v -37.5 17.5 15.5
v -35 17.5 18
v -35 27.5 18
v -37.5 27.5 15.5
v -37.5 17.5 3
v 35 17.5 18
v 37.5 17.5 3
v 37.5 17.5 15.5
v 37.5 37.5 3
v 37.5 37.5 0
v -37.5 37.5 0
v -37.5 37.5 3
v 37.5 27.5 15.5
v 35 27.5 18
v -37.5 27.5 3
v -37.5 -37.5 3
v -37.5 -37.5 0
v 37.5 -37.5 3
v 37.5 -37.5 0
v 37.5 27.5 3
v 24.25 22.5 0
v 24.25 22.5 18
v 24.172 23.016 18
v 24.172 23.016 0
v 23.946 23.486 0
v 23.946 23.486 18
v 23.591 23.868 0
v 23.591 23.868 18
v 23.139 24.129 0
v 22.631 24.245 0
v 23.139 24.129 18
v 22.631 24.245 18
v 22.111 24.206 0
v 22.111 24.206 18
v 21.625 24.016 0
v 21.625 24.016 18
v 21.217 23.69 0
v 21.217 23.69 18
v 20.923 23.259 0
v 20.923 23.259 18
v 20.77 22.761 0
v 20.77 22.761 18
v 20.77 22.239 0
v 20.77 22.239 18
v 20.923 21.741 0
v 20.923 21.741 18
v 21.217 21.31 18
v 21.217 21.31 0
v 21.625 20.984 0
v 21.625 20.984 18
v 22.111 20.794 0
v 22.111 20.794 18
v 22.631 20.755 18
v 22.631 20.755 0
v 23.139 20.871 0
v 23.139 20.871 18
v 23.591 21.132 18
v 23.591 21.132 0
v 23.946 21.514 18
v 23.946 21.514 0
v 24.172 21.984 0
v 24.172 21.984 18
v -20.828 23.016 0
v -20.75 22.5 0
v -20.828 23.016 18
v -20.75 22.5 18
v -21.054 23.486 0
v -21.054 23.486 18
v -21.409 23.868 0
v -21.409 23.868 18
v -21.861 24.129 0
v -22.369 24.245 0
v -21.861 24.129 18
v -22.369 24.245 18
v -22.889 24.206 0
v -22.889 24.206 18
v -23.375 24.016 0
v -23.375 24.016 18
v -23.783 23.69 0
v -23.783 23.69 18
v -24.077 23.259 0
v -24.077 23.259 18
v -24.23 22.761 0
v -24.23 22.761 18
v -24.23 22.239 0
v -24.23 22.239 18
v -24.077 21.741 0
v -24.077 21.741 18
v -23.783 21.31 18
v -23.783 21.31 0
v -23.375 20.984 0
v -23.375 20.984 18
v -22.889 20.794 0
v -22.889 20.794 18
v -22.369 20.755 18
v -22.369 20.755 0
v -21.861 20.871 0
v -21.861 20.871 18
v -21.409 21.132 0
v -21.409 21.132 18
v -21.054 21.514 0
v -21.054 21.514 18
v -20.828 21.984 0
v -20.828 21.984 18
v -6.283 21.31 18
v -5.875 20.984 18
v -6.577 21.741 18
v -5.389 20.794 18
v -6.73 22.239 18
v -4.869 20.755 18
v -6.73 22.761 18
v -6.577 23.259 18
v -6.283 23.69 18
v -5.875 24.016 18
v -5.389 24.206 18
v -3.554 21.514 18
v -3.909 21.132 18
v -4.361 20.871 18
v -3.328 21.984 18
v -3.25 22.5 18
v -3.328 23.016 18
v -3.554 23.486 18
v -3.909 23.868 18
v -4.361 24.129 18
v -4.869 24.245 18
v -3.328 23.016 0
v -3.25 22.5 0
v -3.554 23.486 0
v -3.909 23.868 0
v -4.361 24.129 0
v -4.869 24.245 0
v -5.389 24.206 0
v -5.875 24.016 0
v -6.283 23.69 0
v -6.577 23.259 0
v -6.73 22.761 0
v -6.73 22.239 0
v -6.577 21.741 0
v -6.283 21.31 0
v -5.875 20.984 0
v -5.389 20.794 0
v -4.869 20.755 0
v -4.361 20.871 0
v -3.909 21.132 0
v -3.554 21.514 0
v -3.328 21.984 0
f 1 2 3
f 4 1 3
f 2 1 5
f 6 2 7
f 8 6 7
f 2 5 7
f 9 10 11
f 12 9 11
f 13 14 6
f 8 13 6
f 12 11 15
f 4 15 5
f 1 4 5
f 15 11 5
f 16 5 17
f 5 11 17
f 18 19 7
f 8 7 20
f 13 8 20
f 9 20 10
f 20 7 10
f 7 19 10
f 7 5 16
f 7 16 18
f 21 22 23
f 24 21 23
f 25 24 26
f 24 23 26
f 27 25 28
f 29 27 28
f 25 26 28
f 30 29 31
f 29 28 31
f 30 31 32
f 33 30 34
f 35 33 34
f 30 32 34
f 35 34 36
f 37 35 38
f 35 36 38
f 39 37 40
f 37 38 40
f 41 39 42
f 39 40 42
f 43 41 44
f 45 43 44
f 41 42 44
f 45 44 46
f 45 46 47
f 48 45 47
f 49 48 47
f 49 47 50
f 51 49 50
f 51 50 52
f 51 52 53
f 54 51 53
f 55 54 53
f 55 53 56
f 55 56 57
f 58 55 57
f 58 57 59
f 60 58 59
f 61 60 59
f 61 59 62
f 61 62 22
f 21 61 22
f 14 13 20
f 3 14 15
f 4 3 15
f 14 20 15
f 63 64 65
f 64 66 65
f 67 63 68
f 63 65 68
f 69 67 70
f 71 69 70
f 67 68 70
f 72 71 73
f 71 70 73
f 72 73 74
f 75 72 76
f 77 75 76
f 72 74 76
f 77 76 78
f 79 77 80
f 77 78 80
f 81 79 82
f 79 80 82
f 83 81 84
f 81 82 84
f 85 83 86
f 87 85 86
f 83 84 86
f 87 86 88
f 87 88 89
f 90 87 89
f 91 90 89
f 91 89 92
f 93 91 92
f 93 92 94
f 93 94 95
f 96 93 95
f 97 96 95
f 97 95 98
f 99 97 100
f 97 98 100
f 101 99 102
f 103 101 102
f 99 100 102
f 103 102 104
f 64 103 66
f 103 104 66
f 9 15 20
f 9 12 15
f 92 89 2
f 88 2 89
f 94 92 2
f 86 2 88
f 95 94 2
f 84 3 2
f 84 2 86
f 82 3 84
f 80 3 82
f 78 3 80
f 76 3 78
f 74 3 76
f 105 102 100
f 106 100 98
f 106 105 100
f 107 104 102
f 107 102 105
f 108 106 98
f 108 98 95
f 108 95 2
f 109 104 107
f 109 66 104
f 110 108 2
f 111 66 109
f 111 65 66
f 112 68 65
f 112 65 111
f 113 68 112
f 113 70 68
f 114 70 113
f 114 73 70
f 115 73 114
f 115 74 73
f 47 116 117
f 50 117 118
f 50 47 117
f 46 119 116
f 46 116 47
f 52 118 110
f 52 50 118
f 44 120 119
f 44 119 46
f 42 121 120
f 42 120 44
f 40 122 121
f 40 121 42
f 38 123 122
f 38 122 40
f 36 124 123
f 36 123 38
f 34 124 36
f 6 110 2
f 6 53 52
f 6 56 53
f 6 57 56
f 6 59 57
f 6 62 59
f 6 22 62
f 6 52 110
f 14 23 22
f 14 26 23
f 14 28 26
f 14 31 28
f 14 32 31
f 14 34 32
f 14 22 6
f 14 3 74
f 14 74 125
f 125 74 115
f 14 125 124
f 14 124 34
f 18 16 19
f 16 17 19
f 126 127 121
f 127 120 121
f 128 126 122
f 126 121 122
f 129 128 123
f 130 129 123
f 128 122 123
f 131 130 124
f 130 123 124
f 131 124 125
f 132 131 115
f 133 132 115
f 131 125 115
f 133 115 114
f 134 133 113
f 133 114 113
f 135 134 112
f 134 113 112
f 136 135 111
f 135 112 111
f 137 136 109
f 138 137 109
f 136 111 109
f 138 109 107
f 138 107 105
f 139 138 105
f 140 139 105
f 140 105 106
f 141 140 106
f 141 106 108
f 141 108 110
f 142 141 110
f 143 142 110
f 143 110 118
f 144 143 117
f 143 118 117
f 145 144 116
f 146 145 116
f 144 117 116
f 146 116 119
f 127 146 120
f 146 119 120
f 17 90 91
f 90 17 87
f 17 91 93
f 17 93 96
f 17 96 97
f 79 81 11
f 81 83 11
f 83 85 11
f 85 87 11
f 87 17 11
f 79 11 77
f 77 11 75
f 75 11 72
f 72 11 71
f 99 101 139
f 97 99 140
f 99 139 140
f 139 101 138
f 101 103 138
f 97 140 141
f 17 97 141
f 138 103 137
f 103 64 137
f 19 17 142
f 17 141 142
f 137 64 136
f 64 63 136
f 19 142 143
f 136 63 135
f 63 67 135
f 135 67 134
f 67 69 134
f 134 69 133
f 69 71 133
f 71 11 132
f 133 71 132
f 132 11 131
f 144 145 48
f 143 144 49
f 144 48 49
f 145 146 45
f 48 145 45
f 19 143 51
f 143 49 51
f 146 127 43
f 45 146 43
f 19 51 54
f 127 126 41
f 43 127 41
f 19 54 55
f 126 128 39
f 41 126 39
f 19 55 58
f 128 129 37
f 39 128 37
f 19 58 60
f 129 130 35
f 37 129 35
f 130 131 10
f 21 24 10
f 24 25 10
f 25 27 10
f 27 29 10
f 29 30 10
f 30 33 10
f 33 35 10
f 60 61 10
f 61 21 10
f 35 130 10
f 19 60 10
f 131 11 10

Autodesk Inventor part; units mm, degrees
ref_plane "YZ Plane" through (0, 0, 0) normal (1, 0, 0) x (0, 1, 0)
ref_plane "XZ Plane" through (0, 0, 0) normal (0, 1, 0) x (-1, 0, 0)
ref_plane "XY Plane" through (0, 0, 0) normal (0, 0, 1) x (1, 0, 0)
sketch "Sketch1" plane through (0, 0, 0) normal (0, 0, 1) x (1, 0, 0)
  line L0 (-52.5, 0) -> (52.5, 0) projected
  line L1 (0, -52.5) -> (0, 52.5) projected
  line L2 (-37.5, -37.5) -> (37.5, -37.5)
  line L3 (37.5, -37.5) -> (37.5, 37.5)
  line L4 (37.5, 37.5) -> (-37.5, 37.5)
  line L5 (-37.5, 37.5) -> (-37.5, -37.5)
  line L6 (-37.5, -37.5) -> (37.5, 37.5) construction
  line L7 (37.5, -37.5) -> (-37.5, 37.5) construction
  point P0 (0, 0)
  dimension "d0" = 75
  dimension "d1" = 75
extrude "Extrusion1" add sketch "Sketch1" along normal blind 3
sketch "Sketch2" plane through (0, 0, 3) normal (0, 0, 1) x (1, 0, 0)
  line L0 (37.5, -37.5) -> (37.5, 37.5) projected
  line L1 (37.5, 37.5) -> (-37.5, 37.5) projected
  line L2 (37.5, 17.5) -> (37.5, 27.5)
  line L3 (37.5, 27.5) -> (-37.5, 27.5)
  line L4 (-37.5, 27.5) -> (-37.5, 17.5)
  line L5 (-37.5, 17.5) -> (37.5, 17.5)
  point P0 (0, 0)
  dimension "d4" = 10
  dimension "d5" = 10
extrude "Extrusion2" add sketch "Sketch2" along normal blind 15
chamfer "Chamfer1" distance 2.5 angle 45 2 edges at (37.5, 22.5, 18) (-37.5, 22.5, 18)
sketch "Sketch3" plane through (0, 0, 18) normal (0, 0, 1) x (1, 0, 0)
  line L0 (-35, 17.5) -> (-35, 27.5) projected
  line L1 (35, 27.5) -> (35, 17.5) projected
  line L2 (-35, 22.5) -> (35, 22.5) construction
  circle A0 centre (-5, 22.5) radius 1.75
  circle A1 centre (-22.5, 22.5) radius 1.75
  line L3 (0, -52.5) -> (0, 52.5) projected
  circle A2 centre (22.5, 22.5) radius 1.75
  point P0 (0, 0)
  dimension "d11" = 45
  dimension "d12" = 17.5
  dimension "d13" = 5
  dimension "d14" = 3.5
extrude "Extrusion3" cut sketch "Sketch3" against normal through all
sketch "Sketch4" plane through (0, 0, 0) normal (0, 0, -1) x (-1, 0, 0)
  circle A0 centre (22.5, 22.5) radius 1.75 projected
  circle A1 centre (5, 22.5) radius 1.75 projected
  circle A2 centre (-22.5, 22.5) radius 1.75 projected
  line L0 (37.5, -37.5) -> (-37.5, -37.5) projected
  line L1 (37.5, 37.5) -> (37.5, -37.5) projected
  line L2 (-37.5, 37.5) -> (37.5, 37.5) projected
  line L3 (-37.5, -37.5) -> (-37.5, 37.5) projected
  circle A3 centre (-22.5, 22.5) radius 3.25
  circle A4 centre (5, 22.5) radius 3.25
  circle A5 centre (22.5, 22.5) radius 3.25
  point P0 (0, 0)
  dimension "d17" = 6.5
properties part number "misc_hand_stand"
